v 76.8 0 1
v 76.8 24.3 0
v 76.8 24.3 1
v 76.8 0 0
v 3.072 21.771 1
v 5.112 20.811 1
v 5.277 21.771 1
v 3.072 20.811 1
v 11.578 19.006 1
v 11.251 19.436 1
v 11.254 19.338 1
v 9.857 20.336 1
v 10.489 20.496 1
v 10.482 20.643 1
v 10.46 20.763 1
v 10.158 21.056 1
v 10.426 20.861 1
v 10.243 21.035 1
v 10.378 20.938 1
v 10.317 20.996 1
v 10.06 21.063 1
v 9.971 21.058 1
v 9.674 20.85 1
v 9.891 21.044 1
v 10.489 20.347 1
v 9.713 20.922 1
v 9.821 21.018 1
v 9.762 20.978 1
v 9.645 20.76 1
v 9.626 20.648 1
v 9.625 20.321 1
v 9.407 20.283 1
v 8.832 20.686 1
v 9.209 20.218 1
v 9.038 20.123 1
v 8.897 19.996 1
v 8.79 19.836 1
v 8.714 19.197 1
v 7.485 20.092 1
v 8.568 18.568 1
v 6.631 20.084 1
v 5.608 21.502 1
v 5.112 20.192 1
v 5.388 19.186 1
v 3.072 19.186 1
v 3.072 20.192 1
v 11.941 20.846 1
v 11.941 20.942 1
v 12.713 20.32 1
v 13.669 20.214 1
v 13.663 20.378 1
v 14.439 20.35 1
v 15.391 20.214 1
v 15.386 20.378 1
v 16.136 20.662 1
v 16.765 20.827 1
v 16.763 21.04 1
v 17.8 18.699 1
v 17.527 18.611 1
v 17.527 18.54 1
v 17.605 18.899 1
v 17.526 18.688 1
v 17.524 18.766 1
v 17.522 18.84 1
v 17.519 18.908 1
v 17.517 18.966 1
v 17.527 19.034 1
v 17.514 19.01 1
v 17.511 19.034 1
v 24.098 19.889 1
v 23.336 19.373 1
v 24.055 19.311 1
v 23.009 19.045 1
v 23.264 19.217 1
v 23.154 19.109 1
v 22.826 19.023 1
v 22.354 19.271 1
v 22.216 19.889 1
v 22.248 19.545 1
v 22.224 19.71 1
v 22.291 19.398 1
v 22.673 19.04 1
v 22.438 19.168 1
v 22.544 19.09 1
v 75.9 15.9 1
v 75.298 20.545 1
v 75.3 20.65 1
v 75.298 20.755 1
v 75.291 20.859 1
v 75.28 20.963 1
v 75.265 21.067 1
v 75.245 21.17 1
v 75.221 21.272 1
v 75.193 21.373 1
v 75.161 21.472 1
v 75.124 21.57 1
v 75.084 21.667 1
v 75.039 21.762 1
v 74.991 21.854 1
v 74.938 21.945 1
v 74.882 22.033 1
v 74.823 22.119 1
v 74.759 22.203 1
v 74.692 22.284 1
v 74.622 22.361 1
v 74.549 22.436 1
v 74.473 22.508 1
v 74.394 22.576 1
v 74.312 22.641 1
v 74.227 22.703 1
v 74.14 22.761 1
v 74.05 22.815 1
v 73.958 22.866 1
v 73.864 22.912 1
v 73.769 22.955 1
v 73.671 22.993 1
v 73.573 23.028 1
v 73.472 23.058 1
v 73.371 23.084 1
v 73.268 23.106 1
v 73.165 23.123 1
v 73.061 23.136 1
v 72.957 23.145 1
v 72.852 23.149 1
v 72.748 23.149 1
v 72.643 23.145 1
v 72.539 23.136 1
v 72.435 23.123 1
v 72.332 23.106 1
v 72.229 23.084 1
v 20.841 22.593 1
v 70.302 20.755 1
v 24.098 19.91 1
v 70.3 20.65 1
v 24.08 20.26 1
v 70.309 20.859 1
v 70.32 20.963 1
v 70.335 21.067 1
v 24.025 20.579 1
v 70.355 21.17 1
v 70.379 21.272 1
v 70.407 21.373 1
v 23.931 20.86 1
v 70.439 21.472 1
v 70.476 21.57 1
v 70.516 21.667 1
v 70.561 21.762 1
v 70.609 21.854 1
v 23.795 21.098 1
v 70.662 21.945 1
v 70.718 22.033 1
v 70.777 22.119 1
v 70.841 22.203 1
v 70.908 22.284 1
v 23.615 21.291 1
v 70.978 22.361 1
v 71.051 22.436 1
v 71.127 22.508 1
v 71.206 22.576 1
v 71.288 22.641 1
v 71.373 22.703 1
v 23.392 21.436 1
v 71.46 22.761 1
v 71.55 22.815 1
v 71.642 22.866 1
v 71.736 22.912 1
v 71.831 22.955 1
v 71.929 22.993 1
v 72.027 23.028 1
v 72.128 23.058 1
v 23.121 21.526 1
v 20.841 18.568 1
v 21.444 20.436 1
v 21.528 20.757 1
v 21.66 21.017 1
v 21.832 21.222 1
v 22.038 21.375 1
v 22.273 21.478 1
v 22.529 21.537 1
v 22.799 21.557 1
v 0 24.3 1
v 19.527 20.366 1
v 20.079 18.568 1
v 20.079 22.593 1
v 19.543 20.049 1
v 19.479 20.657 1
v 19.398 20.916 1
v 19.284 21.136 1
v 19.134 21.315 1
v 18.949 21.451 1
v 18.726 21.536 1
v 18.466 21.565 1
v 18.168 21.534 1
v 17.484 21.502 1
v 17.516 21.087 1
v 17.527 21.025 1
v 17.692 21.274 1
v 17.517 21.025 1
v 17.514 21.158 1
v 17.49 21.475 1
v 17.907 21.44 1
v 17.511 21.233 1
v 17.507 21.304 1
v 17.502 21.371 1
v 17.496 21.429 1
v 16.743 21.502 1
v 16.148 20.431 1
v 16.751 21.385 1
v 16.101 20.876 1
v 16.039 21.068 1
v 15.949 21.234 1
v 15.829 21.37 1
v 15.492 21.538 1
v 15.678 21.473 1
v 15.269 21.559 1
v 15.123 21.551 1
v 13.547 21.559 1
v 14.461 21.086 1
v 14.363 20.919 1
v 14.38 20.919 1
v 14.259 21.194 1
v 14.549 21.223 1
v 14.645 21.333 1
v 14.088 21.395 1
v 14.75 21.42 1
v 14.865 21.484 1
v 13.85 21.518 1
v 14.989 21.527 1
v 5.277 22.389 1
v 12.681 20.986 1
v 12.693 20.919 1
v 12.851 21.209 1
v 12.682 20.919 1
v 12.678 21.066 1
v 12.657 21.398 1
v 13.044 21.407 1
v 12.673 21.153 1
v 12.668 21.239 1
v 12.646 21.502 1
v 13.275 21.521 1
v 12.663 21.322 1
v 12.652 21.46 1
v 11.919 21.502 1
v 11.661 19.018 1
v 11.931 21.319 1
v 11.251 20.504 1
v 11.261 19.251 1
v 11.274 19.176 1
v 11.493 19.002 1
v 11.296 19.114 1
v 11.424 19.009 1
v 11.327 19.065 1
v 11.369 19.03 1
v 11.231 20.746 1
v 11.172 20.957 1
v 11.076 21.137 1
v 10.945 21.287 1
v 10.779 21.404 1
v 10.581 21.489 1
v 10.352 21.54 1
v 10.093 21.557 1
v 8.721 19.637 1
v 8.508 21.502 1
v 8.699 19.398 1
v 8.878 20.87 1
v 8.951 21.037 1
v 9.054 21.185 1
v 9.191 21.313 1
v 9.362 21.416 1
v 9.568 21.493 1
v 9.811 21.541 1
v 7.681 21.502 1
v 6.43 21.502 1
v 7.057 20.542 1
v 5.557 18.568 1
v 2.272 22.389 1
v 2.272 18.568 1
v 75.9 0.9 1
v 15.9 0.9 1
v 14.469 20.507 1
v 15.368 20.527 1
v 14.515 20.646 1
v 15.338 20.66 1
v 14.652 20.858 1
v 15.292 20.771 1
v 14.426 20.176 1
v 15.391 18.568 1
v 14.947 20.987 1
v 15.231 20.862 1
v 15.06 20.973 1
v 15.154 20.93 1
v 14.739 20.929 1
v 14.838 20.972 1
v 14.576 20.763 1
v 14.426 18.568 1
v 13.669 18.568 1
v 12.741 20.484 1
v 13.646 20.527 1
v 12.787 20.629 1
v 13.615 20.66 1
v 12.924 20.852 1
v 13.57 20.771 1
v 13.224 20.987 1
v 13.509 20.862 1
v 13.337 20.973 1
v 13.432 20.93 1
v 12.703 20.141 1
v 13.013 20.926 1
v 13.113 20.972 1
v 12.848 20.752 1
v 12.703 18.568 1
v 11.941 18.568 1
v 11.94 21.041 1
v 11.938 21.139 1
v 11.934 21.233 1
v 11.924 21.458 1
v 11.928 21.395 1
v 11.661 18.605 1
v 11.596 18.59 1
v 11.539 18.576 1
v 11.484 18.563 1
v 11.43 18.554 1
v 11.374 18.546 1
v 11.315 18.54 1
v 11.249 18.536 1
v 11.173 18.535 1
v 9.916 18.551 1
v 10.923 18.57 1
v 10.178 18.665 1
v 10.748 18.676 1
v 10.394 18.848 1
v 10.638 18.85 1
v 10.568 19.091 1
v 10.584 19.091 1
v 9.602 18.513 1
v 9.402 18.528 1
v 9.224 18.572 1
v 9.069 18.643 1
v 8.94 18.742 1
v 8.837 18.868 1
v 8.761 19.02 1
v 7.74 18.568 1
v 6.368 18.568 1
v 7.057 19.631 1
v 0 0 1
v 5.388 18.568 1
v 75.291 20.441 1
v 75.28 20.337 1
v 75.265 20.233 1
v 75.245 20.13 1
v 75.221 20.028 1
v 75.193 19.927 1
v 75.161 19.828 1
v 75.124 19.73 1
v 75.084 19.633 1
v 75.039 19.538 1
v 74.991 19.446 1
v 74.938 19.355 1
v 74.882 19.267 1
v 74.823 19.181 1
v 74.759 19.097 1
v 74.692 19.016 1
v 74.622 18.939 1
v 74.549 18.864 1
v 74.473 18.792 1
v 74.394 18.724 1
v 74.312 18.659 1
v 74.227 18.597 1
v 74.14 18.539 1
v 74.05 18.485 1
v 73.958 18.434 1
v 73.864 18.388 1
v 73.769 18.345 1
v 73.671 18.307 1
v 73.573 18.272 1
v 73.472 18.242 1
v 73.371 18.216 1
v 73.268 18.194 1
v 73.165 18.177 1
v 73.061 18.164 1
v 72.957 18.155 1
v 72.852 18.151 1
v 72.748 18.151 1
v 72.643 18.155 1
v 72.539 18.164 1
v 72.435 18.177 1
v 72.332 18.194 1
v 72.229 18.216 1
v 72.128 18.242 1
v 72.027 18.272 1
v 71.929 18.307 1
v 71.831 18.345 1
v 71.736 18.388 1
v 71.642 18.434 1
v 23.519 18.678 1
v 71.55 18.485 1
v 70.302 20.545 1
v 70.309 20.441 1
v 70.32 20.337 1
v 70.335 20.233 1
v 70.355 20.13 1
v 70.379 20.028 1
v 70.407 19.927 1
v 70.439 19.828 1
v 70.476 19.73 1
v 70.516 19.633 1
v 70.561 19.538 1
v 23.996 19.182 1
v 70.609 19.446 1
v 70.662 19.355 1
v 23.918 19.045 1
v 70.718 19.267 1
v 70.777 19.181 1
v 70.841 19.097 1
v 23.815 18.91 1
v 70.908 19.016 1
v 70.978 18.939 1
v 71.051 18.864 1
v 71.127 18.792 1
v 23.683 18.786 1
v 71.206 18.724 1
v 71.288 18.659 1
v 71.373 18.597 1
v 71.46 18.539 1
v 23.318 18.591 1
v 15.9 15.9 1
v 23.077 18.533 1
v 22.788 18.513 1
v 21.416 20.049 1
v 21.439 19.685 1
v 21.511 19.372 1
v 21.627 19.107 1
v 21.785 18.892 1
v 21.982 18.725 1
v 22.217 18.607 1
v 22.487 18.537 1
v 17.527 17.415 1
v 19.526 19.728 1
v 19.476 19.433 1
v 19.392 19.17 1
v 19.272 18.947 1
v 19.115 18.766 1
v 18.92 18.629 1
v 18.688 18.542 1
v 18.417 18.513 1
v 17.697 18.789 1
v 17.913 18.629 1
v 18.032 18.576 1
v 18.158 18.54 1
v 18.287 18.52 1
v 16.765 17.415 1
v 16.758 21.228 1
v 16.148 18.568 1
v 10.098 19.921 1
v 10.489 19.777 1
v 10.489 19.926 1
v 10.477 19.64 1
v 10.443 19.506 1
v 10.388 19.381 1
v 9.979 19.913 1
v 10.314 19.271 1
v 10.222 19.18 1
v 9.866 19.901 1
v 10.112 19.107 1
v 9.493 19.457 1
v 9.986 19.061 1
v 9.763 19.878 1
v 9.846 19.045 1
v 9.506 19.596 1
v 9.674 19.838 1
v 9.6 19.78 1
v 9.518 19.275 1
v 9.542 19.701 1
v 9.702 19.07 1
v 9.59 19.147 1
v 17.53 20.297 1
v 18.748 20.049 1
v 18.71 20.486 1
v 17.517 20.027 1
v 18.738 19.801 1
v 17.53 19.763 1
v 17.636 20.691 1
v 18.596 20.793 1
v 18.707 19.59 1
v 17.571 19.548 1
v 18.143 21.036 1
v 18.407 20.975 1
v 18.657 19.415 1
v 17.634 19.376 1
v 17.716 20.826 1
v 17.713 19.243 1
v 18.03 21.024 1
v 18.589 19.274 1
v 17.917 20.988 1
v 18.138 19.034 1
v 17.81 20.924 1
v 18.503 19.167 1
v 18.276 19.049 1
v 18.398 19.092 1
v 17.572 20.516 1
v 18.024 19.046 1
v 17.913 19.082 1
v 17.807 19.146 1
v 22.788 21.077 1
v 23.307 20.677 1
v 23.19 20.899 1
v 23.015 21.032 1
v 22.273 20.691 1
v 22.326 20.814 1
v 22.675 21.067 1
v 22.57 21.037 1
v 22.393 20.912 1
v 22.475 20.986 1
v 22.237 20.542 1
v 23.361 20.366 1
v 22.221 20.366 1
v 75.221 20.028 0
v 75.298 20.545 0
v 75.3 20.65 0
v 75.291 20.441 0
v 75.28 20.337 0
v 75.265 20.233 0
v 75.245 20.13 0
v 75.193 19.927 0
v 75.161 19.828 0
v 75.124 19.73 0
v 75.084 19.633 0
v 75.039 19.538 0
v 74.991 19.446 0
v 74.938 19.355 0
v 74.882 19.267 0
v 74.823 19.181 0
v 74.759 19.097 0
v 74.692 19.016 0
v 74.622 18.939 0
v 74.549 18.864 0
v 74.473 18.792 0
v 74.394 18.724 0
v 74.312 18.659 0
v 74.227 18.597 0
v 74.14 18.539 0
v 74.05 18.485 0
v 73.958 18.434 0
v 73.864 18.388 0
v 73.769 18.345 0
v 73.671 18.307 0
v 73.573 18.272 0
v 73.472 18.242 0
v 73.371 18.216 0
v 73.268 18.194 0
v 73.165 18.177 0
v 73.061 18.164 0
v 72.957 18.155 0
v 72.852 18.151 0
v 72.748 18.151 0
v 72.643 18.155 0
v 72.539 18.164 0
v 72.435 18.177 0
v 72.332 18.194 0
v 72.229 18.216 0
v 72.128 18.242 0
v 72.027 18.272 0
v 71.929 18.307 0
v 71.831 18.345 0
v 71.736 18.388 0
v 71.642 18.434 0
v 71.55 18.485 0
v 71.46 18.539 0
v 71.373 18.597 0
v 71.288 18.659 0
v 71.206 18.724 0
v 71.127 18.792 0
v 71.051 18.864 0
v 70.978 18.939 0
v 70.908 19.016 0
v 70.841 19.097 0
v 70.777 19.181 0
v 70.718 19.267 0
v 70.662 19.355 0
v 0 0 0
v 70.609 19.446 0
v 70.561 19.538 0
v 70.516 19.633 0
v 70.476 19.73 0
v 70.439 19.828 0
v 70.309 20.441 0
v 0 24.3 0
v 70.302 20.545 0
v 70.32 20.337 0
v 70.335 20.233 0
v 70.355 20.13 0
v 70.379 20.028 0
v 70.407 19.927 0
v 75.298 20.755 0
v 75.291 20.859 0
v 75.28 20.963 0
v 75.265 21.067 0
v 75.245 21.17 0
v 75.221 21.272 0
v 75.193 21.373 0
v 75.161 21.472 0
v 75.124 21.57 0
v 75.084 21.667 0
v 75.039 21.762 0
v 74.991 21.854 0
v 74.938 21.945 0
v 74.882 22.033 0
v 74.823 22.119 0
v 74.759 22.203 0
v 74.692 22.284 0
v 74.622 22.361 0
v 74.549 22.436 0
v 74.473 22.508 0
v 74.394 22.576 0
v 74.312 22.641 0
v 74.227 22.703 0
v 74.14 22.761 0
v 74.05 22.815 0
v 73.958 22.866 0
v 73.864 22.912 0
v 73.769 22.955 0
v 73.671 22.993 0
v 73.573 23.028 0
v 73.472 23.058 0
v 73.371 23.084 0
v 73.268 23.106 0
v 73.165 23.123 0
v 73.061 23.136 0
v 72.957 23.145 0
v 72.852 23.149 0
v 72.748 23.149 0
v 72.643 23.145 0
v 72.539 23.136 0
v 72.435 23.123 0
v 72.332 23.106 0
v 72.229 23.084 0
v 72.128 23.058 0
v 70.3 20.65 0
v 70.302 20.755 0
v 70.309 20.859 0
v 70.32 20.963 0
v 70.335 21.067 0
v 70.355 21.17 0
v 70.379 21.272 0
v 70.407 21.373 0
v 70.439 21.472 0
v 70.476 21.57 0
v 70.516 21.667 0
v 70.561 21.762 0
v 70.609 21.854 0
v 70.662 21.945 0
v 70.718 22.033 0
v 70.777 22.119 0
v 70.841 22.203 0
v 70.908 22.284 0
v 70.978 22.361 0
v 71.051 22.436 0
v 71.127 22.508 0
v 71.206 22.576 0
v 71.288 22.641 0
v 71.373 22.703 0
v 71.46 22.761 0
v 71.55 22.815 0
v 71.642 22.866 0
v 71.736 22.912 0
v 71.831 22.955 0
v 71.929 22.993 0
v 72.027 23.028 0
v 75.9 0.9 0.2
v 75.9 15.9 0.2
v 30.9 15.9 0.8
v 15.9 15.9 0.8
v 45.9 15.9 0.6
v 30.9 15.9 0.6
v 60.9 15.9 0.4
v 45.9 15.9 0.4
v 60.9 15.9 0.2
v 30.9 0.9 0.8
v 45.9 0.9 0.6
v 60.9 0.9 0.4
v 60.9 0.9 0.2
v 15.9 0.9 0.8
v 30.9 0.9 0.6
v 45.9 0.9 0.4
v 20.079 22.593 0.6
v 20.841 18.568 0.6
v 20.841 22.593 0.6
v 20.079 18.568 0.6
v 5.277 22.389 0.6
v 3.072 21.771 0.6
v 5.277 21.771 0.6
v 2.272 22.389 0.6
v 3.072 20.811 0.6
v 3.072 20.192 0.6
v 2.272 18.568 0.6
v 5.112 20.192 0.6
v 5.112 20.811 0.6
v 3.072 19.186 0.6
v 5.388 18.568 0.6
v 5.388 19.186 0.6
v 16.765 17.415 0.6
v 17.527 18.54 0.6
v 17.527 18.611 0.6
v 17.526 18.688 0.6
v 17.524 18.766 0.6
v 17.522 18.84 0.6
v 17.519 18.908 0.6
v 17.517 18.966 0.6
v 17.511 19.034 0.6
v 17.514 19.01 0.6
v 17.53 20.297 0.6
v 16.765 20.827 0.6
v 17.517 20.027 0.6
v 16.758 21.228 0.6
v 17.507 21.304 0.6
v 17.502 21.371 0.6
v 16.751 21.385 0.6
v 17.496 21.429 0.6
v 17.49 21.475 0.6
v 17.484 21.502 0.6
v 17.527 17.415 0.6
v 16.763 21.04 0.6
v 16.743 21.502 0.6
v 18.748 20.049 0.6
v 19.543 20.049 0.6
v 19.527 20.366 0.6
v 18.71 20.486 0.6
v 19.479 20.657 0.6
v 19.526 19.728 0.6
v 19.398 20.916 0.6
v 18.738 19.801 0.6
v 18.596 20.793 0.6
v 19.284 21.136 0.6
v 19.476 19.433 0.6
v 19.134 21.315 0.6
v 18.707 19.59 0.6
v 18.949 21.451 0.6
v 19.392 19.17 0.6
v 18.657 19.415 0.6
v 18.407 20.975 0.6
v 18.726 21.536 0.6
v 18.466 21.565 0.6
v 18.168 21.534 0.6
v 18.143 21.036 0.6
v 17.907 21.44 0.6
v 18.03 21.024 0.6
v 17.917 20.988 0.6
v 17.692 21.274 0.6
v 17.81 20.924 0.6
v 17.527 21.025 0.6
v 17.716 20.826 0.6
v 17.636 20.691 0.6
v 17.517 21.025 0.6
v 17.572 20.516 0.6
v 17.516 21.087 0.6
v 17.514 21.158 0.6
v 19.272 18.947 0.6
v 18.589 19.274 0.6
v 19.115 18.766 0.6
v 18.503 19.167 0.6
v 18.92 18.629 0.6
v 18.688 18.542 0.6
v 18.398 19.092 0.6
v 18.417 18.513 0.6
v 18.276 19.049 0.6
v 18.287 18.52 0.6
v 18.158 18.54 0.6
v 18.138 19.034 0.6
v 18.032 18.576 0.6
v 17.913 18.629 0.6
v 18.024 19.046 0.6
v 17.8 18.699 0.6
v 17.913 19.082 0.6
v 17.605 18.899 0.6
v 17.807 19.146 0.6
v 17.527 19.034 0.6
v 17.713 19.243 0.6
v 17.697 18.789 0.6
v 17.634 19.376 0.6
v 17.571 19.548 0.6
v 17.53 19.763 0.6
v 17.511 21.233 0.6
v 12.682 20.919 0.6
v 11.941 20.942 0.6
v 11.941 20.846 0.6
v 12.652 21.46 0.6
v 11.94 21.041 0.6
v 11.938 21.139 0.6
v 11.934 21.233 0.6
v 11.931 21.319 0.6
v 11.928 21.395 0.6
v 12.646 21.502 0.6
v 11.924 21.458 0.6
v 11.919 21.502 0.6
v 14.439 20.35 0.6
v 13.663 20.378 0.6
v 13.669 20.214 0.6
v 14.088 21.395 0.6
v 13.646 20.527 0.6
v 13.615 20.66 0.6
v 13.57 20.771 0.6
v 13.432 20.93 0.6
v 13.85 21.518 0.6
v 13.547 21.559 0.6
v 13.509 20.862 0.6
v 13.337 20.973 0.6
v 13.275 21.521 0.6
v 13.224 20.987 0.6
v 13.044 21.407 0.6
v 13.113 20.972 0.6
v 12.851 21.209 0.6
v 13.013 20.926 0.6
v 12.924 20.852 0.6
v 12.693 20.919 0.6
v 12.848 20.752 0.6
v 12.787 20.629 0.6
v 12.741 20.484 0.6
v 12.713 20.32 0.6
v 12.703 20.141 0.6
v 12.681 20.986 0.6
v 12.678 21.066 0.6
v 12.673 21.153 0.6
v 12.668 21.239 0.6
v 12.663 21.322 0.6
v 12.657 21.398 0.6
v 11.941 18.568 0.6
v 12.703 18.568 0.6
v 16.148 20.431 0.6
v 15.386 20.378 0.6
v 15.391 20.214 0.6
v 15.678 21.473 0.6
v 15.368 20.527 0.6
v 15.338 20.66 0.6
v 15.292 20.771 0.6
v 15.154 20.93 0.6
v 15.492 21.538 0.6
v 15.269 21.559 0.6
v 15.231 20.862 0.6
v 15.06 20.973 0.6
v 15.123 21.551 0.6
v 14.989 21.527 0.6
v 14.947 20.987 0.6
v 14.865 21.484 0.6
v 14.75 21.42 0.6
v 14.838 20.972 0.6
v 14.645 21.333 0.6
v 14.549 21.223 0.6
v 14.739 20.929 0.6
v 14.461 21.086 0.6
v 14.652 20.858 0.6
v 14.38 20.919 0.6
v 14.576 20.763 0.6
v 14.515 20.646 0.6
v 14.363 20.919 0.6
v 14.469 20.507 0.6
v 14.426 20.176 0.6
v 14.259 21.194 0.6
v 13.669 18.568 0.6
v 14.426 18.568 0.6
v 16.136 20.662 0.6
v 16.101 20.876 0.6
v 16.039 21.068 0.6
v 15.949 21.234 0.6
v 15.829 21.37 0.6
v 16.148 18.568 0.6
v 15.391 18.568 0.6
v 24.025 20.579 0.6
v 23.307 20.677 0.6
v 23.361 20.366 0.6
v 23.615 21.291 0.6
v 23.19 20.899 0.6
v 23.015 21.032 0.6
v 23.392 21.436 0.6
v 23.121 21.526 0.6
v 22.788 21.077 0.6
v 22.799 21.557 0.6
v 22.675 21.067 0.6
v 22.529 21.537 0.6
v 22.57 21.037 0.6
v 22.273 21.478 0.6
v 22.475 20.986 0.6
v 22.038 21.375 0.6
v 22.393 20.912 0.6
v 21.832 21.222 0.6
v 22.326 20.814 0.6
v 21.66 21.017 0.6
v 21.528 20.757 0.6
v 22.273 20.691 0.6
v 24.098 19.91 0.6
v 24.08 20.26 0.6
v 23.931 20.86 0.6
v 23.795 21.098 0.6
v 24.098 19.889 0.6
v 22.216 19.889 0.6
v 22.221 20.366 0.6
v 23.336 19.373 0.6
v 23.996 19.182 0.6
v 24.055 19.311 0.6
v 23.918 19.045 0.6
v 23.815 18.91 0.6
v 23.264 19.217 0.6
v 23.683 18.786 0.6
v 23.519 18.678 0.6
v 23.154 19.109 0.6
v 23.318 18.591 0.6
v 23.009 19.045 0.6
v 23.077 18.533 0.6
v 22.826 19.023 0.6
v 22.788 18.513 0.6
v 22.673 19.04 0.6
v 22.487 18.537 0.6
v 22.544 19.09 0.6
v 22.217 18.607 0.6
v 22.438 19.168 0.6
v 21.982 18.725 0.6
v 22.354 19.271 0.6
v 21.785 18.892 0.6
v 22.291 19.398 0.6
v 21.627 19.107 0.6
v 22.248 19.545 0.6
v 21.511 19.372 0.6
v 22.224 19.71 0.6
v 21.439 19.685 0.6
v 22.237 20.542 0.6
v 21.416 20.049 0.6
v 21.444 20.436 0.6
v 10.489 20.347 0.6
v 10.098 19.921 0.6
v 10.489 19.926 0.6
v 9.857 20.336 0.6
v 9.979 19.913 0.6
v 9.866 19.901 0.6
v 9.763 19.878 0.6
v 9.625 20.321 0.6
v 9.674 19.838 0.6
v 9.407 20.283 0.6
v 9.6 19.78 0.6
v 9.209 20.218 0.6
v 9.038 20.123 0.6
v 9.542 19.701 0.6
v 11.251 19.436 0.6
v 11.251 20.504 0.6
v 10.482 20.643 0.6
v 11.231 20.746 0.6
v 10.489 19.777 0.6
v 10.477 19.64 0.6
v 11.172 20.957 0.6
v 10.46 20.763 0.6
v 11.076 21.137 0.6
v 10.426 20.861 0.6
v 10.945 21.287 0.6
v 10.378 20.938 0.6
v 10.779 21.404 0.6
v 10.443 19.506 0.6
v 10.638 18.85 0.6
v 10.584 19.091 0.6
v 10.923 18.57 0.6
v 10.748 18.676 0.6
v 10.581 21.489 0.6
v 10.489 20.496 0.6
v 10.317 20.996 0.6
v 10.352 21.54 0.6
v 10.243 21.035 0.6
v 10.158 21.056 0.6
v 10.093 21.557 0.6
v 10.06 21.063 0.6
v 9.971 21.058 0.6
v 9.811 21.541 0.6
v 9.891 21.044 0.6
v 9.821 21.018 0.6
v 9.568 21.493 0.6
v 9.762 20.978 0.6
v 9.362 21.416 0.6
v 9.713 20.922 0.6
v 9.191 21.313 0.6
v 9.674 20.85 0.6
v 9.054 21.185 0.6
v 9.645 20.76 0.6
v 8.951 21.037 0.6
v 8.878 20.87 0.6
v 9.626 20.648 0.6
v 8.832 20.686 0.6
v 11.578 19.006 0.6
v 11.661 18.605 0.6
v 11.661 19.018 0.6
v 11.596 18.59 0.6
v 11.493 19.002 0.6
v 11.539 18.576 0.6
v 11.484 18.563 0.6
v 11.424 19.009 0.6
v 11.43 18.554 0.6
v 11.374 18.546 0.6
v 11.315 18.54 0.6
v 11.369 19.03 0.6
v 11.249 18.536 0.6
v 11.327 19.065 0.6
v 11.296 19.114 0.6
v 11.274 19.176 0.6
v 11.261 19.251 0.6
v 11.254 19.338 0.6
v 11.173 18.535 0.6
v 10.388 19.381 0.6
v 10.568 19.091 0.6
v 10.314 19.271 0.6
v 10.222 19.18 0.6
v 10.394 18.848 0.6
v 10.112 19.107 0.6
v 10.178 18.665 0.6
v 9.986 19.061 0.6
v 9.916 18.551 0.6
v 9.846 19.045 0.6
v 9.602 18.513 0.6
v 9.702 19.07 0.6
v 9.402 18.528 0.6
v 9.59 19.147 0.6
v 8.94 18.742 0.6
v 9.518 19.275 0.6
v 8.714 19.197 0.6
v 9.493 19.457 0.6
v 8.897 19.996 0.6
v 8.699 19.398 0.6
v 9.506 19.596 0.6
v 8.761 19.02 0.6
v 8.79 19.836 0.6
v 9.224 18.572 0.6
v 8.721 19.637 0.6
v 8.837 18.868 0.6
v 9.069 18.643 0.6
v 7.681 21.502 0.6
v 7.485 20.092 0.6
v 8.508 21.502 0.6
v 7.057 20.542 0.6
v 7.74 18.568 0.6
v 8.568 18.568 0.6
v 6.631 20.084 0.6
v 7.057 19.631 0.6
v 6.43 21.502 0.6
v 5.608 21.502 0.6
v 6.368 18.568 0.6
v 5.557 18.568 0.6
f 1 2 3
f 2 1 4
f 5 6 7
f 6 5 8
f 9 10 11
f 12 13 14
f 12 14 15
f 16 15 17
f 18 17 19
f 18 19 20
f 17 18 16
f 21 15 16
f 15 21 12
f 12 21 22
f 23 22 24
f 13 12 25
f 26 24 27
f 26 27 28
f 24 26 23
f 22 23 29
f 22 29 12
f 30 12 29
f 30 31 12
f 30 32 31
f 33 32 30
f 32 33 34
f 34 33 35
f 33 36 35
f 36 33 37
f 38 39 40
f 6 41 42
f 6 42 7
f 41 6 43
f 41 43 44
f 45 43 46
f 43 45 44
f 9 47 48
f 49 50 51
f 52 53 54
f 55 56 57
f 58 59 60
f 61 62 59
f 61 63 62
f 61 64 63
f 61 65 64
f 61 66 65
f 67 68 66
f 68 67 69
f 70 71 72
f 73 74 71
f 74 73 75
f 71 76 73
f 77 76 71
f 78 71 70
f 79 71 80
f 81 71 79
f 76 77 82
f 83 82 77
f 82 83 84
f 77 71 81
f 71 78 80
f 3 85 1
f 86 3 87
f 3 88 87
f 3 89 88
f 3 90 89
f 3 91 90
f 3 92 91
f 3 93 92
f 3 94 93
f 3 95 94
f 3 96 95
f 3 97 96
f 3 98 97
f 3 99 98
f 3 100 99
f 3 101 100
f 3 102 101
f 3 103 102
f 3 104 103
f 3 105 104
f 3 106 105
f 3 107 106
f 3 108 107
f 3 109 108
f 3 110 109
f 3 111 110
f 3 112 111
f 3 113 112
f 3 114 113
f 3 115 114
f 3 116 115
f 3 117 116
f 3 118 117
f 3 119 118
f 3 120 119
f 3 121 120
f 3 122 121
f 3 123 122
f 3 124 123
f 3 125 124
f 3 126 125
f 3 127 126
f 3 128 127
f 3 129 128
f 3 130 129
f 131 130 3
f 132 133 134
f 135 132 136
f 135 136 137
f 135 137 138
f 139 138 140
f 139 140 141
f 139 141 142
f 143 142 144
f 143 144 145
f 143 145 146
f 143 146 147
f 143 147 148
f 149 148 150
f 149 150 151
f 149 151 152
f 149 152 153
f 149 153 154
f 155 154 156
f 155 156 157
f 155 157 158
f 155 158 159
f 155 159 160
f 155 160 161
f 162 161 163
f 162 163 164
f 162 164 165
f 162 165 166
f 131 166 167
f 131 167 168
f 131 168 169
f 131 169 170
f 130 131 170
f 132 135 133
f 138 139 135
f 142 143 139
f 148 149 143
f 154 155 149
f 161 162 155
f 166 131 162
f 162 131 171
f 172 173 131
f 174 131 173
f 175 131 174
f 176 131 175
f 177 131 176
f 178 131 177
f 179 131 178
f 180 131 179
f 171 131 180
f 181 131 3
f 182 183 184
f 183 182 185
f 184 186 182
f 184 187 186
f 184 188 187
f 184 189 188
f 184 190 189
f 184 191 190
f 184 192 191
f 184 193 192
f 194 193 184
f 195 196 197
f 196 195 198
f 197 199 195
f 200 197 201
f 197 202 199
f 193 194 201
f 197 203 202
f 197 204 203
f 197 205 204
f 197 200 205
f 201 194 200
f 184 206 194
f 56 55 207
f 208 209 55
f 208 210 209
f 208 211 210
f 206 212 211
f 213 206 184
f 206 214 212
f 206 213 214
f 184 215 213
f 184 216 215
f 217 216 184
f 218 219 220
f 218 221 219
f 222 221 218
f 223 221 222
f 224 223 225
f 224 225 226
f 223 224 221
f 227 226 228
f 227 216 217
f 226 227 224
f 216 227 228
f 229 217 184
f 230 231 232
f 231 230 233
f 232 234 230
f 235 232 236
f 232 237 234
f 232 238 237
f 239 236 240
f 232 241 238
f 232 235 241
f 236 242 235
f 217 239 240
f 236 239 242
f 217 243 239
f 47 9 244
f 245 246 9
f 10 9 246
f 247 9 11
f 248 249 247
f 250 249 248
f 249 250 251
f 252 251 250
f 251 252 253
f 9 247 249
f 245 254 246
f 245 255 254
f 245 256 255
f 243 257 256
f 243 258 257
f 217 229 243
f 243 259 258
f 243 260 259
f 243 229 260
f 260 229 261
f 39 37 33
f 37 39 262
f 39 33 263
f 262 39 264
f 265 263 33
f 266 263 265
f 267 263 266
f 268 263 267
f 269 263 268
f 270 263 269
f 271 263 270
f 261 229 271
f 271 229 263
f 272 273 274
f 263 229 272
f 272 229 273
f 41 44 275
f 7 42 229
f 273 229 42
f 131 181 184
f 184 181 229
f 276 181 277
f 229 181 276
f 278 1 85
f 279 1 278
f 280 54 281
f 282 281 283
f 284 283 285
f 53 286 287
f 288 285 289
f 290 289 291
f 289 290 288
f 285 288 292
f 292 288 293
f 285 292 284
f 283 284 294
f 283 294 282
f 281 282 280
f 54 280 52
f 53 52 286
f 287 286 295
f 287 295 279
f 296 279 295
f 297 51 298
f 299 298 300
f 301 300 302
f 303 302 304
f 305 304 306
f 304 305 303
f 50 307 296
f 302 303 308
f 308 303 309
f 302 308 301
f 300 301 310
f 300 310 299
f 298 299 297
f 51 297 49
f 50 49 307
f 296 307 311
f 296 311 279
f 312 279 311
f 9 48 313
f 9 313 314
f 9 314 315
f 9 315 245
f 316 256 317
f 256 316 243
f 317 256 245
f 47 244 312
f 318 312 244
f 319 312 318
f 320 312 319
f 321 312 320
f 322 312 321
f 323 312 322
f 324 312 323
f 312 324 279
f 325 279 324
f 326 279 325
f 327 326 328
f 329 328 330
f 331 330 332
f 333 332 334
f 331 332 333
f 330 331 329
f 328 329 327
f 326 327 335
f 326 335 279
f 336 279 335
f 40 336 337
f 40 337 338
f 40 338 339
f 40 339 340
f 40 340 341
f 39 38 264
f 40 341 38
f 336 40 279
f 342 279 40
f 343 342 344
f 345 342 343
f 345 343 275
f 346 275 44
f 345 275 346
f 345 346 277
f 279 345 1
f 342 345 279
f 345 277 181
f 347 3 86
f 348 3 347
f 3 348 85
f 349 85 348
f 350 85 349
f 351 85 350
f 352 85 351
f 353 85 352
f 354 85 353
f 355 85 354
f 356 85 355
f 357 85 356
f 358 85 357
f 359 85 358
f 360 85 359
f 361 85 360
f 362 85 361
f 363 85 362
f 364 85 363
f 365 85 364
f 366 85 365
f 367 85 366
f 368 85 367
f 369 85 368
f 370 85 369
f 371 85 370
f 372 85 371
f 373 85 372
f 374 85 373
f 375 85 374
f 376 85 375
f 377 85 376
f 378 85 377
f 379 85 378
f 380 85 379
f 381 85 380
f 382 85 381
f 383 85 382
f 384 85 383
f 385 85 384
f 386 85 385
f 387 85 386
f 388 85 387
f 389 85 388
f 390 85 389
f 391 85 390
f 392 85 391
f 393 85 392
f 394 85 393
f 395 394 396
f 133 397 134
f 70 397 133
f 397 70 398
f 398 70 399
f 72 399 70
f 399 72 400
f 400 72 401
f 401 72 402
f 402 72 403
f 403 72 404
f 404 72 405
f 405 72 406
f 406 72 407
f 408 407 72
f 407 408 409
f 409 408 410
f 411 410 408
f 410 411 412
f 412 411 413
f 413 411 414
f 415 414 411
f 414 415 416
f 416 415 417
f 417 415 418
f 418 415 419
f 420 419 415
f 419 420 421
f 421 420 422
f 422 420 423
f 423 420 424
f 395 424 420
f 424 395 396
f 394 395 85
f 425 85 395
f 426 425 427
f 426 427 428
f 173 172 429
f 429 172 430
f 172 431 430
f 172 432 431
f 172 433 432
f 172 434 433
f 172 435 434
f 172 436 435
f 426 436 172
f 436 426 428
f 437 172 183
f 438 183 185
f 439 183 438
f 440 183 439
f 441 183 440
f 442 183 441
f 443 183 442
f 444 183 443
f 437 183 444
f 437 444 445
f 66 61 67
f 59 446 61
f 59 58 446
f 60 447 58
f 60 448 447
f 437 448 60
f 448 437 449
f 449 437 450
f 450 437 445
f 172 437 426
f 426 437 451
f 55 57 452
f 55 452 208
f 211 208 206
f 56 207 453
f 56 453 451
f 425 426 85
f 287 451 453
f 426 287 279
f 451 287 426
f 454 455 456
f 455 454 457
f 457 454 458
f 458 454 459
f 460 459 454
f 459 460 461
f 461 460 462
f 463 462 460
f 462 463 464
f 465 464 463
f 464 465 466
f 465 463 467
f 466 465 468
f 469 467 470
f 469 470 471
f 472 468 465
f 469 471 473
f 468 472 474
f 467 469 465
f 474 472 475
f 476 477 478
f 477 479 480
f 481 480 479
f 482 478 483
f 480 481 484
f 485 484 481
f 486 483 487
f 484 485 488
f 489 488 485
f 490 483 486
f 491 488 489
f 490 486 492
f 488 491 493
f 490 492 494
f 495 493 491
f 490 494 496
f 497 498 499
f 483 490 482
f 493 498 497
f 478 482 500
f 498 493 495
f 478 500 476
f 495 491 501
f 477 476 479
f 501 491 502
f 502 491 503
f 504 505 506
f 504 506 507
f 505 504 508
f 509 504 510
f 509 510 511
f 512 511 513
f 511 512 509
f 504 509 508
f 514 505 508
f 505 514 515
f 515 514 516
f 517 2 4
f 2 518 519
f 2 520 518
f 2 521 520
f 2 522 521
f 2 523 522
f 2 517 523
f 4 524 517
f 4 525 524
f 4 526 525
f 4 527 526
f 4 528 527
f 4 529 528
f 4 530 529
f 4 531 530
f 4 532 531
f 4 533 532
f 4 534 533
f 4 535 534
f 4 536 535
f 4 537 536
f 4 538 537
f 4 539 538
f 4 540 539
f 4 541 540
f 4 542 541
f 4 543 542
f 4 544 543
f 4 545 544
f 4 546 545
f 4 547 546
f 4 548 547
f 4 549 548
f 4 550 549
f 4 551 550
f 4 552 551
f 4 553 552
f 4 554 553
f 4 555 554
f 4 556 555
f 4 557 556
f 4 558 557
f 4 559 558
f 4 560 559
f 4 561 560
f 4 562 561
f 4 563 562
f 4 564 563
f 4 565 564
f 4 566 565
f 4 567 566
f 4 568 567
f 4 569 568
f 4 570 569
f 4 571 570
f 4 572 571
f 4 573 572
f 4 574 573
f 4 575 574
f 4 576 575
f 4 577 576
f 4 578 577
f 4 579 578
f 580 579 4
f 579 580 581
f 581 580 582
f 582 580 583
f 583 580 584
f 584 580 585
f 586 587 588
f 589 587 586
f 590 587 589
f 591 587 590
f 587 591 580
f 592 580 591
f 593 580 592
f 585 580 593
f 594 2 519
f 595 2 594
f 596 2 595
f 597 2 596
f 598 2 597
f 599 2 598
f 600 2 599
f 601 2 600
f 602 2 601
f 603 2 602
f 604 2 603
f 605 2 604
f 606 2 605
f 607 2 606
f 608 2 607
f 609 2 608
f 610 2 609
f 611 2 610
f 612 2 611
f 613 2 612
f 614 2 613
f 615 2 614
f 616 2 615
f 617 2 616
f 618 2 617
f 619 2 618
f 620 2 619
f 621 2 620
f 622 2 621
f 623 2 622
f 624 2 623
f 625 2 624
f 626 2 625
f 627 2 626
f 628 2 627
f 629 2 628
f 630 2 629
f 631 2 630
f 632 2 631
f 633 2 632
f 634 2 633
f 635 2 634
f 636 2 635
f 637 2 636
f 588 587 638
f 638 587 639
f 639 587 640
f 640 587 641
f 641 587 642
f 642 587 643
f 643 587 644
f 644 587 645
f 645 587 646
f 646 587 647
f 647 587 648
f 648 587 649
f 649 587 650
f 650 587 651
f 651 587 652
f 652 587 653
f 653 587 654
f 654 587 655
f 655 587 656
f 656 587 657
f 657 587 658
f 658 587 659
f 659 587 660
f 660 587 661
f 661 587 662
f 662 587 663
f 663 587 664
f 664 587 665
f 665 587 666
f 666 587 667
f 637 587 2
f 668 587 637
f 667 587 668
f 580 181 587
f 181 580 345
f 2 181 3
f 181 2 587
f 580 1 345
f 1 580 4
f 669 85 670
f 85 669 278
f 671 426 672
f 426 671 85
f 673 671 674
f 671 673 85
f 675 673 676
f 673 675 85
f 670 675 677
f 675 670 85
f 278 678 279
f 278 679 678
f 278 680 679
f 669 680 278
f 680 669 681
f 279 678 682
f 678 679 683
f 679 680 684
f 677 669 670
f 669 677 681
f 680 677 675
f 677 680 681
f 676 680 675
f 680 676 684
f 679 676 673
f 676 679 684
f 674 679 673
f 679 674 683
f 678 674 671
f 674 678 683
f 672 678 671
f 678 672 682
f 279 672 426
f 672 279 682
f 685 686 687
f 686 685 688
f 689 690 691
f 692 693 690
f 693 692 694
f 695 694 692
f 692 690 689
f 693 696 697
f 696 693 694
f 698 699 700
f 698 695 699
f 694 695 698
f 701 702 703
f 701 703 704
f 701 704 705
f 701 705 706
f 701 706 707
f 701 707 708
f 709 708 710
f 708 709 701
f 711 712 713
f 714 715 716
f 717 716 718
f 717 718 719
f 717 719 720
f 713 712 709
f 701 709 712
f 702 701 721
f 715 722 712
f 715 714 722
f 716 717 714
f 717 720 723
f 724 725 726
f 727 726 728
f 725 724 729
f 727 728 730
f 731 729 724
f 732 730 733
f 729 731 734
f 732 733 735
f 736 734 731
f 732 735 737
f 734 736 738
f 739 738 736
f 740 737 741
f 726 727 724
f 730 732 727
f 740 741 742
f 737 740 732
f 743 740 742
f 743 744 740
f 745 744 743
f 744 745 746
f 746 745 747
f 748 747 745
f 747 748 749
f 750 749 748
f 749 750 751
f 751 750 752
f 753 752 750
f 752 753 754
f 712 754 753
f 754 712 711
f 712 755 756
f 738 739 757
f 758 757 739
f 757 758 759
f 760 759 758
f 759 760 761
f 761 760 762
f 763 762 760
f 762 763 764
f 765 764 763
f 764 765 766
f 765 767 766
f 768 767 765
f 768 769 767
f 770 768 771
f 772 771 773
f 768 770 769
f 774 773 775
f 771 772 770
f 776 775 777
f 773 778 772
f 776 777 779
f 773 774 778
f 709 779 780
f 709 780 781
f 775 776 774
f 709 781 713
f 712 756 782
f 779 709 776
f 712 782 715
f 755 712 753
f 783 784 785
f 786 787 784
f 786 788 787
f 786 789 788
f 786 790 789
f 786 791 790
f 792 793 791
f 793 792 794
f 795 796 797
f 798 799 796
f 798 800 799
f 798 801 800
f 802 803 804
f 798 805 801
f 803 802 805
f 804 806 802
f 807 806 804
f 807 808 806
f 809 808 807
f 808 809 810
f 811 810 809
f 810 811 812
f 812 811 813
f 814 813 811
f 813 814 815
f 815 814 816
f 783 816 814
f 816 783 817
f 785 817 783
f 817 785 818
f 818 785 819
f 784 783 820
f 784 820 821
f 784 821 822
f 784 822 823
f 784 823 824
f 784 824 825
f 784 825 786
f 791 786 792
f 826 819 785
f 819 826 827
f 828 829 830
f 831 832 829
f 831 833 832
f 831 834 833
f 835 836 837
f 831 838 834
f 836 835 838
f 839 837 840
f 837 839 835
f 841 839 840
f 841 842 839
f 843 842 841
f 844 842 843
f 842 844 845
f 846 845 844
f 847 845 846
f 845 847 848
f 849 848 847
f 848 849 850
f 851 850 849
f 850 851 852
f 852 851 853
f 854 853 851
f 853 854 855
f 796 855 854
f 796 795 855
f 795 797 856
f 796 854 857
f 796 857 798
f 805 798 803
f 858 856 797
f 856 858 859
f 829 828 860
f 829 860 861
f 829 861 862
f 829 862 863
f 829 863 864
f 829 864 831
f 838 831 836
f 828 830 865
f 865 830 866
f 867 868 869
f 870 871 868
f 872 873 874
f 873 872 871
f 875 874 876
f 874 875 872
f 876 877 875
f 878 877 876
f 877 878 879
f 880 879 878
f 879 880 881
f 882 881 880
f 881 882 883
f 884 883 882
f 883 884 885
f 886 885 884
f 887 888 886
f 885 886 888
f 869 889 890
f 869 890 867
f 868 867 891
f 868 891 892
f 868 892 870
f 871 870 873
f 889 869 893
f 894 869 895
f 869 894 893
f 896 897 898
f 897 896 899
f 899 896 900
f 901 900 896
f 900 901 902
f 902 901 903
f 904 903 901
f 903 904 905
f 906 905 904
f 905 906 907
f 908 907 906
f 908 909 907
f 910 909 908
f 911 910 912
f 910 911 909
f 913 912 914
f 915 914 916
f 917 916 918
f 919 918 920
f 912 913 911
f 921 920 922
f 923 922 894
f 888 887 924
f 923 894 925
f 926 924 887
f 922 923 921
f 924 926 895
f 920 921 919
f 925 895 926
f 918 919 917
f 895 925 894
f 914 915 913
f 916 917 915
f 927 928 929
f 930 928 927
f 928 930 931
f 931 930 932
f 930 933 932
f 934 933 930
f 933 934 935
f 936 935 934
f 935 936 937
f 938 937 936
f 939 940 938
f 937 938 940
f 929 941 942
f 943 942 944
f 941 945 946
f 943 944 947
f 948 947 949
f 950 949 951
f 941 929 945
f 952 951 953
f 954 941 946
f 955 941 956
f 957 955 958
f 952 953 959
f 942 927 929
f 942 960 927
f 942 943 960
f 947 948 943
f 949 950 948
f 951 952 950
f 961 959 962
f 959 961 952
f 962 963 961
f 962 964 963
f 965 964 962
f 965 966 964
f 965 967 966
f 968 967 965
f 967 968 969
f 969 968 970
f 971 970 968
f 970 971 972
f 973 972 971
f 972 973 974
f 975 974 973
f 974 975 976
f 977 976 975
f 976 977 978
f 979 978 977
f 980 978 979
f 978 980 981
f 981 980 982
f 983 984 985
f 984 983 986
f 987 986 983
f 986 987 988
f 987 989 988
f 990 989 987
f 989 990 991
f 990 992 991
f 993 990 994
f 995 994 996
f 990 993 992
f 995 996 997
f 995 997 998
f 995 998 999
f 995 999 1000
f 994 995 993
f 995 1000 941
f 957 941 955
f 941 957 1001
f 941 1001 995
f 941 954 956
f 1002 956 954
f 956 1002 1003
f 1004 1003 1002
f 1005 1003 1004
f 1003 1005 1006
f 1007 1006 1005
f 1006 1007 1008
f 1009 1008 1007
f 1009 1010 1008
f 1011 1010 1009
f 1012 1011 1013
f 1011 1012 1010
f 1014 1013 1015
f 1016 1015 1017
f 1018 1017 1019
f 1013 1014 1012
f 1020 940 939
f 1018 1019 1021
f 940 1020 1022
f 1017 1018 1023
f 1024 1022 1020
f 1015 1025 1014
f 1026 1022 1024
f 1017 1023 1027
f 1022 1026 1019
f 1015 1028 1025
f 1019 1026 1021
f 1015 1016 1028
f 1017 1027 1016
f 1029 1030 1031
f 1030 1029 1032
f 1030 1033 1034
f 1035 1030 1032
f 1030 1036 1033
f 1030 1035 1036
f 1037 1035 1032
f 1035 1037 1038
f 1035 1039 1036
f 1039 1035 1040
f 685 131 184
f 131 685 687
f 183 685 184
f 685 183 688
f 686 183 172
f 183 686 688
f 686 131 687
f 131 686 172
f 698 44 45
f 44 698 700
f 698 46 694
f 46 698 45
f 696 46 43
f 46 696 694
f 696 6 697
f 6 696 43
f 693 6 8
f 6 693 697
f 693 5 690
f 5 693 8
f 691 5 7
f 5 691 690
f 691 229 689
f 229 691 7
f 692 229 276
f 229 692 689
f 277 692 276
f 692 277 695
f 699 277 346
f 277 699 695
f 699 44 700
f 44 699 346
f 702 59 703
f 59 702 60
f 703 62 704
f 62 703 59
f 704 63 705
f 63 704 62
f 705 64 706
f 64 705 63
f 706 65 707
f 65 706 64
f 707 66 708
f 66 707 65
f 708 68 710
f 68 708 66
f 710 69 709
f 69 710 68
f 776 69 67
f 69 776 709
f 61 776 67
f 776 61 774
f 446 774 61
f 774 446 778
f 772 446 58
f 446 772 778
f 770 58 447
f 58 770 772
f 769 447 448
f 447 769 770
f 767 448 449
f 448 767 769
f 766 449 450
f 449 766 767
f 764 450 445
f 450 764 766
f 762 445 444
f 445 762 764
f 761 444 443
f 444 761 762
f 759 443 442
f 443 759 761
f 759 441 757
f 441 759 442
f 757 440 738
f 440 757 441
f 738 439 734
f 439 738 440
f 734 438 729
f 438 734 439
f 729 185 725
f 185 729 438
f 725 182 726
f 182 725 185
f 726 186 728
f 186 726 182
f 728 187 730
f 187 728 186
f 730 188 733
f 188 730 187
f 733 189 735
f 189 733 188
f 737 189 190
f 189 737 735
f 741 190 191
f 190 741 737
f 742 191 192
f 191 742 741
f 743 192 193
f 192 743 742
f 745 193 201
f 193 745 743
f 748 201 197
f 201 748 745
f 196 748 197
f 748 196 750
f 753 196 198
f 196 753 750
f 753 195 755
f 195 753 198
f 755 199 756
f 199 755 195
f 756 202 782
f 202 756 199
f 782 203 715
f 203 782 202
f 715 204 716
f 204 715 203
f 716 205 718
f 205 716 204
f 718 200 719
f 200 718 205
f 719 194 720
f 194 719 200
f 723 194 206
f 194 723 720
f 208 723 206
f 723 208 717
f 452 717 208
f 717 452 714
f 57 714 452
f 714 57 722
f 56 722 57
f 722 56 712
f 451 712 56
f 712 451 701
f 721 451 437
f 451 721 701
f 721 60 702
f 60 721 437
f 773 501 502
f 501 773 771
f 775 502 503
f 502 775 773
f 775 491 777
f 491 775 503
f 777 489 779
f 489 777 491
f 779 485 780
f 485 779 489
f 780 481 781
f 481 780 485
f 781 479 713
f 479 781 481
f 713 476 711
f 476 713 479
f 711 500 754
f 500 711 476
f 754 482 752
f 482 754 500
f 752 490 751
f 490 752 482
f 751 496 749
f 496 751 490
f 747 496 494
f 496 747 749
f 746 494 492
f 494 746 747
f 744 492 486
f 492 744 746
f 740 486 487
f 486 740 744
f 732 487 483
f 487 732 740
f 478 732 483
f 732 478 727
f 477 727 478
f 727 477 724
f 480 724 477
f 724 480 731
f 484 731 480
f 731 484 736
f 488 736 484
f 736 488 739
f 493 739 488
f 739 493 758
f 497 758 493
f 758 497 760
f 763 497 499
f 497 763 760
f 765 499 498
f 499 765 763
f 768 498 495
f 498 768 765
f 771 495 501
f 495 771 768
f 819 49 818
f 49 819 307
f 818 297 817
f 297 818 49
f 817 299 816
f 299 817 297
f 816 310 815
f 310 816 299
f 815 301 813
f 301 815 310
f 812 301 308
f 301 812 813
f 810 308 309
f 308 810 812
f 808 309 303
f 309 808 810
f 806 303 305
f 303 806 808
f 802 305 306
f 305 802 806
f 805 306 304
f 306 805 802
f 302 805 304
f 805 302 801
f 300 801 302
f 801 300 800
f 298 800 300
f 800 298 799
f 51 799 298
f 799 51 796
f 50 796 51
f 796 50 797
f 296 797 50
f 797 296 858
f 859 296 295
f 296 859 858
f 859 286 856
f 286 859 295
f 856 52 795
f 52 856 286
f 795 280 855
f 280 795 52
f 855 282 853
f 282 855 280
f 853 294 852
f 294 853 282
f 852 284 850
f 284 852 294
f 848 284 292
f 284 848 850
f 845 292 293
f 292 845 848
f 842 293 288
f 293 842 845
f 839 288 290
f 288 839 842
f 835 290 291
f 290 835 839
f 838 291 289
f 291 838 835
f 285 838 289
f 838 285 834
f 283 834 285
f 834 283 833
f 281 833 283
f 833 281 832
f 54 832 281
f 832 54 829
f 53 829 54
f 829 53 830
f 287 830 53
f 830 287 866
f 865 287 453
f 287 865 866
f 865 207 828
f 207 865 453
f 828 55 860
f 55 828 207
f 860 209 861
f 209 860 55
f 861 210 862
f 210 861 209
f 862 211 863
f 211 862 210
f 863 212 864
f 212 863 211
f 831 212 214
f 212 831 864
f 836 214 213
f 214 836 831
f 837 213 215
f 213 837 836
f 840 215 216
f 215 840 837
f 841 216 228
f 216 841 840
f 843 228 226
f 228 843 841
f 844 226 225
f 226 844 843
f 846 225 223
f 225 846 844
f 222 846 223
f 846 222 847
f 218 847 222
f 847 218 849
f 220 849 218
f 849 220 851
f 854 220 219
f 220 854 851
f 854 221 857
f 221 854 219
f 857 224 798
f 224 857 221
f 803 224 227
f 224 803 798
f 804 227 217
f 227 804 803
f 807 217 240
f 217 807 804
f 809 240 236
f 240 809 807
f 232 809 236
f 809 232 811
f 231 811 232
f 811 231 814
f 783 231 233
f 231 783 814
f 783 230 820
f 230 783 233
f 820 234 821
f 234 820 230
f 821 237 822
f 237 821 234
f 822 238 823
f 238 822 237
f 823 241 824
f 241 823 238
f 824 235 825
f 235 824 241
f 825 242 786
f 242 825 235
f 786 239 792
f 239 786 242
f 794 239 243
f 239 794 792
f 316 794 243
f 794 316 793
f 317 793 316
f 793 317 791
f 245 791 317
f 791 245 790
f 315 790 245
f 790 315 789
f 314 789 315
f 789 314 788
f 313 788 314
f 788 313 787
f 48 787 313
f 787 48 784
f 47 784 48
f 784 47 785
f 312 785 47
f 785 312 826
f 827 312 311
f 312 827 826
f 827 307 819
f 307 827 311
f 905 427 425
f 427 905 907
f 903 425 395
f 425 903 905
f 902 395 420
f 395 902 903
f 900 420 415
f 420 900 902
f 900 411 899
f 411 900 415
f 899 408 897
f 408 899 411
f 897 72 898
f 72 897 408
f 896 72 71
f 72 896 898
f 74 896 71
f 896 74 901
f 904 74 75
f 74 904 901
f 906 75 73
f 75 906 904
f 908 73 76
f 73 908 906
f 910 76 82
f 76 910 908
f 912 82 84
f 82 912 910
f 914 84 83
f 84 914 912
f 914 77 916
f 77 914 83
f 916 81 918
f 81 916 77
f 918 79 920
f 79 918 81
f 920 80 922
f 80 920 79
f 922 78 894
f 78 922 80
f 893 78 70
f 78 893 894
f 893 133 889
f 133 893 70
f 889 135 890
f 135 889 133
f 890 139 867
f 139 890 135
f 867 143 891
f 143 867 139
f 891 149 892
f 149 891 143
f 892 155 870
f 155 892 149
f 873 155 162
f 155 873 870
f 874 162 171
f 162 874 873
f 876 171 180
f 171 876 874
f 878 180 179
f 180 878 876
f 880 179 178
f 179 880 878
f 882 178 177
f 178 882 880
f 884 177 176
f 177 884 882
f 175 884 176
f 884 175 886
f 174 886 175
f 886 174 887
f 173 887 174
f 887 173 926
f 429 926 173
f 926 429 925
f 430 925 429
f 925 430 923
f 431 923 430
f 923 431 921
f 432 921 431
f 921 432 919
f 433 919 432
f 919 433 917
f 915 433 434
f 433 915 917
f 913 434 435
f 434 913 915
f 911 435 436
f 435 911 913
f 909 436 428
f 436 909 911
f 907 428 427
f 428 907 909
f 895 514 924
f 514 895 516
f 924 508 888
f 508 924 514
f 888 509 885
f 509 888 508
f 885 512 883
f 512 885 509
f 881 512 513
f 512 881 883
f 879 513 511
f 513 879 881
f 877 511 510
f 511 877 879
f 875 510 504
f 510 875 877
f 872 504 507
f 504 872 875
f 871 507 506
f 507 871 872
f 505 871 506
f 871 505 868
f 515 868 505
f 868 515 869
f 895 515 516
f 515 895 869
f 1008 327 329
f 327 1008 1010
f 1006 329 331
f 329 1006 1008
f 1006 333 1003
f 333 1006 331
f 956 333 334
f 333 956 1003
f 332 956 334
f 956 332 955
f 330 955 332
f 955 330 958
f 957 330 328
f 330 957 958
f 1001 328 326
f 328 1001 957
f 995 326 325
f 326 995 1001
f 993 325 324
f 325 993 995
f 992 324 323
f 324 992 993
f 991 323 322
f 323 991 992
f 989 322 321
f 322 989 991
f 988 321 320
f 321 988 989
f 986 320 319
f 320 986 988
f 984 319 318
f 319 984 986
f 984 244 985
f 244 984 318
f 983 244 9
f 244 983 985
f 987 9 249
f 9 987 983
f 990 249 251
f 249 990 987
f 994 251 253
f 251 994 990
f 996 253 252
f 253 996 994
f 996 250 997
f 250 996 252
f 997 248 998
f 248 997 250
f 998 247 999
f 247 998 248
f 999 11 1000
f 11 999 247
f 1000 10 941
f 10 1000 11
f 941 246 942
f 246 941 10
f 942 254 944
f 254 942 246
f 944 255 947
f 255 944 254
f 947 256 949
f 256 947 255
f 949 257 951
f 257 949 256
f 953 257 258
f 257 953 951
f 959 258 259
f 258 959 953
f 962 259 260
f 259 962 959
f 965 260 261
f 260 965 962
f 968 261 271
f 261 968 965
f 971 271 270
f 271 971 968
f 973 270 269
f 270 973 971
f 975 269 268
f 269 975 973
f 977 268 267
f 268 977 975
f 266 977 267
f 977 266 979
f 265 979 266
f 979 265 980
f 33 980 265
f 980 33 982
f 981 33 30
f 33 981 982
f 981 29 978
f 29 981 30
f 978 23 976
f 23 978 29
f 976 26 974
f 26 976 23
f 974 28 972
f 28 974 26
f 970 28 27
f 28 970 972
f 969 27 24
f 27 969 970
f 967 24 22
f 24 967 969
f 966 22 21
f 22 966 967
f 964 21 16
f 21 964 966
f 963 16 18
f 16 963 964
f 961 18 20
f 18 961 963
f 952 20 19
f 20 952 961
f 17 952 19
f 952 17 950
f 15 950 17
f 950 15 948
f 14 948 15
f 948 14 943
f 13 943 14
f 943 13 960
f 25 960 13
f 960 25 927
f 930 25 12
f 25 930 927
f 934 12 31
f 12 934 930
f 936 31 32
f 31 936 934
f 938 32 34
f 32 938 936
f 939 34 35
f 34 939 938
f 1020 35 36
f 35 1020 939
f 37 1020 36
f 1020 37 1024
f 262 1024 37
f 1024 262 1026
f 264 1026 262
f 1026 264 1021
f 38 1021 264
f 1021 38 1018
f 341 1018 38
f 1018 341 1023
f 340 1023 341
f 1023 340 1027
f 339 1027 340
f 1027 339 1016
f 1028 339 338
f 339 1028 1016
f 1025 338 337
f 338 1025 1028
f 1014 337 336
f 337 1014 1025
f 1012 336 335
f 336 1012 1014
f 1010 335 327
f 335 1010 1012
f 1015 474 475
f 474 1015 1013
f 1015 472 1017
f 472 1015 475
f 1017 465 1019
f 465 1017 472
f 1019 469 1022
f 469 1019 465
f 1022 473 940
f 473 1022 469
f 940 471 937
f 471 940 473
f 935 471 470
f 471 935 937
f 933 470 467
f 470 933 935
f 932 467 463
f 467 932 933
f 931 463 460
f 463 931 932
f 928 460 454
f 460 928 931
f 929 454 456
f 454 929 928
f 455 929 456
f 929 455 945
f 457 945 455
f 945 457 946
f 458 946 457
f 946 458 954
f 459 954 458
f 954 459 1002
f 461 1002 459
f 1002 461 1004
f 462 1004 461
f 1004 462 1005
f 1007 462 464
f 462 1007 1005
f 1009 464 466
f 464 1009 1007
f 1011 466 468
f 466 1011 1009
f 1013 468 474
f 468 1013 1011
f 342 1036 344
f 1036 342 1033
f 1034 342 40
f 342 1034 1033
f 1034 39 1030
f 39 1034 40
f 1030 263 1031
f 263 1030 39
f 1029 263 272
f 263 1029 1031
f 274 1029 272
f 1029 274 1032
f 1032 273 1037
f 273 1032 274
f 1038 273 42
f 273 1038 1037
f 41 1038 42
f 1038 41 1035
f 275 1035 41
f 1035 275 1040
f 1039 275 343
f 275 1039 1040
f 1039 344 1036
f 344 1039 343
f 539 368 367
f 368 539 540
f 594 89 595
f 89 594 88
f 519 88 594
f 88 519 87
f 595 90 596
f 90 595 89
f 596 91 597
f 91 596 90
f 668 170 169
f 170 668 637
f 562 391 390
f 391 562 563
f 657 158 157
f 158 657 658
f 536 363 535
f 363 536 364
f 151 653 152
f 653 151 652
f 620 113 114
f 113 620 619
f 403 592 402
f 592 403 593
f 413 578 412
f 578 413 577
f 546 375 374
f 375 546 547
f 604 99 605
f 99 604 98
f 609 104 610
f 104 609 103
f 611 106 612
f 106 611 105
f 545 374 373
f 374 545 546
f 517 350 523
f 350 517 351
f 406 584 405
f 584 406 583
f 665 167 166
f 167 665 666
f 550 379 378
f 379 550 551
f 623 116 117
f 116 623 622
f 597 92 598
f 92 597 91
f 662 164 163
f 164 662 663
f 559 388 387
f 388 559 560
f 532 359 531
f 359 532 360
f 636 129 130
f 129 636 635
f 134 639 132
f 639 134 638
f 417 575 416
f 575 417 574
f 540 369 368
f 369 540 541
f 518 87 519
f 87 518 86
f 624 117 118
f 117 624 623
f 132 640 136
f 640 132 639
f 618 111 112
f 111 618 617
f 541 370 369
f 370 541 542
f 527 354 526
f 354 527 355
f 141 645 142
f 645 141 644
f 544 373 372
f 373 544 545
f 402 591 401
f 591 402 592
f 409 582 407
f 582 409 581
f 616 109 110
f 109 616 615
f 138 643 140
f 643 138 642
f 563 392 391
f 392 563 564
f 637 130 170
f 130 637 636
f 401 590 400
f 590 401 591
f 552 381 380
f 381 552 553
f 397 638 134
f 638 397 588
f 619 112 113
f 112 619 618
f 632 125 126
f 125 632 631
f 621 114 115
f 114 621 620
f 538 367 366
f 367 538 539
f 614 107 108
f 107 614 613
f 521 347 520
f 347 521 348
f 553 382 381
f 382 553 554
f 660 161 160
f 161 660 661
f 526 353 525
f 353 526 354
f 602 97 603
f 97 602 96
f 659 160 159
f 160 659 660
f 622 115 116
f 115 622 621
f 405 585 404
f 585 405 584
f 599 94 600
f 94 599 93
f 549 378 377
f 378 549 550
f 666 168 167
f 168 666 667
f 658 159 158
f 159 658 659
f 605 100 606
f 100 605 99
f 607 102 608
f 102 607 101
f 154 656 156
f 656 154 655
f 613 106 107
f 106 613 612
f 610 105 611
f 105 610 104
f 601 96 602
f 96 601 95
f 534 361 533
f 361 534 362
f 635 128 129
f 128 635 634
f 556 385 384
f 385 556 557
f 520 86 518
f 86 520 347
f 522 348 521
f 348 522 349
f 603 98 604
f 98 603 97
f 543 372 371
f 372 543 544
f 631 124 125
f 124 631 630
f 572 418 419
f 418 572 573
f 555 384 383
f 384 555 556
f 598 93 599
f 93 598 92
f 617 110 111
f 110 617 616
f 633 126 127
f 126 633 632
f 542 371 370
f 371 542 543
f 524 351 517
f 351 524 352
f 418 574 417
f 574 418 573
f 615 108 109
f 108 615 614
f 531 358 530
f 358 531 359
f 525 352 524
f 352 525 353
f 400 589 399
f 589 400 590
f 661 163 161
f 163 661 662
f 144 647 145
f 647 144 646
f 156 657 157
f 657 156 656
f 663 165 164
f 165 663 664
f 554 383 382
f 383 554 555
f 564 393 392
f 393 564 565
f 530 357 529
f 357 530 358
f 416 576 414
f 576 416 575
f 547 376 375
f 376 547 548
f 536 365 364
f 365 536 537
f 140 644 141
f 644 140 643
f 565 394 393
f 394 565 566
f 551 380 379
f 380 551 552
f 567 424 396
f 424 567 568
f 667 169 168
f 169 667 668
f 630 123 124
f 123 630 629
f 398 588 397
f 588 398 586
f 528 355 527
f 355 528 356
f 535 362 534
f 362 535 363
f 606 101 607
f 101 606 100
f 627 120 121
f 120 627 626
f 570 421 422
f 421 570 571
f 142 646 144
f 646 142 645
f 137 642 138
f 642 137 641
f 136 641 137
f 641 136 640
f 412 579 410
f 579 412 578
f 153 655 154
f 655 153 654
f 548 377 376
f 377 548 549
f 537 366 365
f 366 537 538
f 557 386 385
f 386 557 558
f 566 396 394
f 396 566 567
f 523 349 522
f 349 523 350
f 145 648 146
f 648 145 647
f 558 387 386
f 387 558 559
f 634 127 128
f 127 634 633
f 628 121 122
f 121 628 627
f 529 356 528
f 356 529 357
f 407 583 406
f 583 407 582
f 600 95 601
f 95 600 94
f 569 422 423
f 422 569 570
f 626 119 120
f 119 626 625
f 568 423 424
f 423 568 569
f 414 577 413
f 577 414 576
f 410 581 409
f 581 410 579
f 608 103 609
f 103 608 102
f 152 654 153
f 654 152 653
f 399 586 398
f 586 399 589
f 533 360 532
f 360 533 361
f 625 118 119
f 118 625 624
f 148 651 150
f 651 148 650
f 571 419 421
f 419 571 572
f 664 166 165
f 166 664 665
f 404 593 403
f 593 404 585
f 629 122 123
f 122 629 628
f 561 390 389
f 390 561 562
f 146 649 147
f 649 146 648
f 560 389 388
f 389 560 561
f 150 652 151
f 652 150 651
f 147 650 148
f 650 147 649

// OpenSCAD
label_text = "Example";
text_size = 4;
text_emboss_depth = 0.4;
swatch_square_size = 15;
num_squares = 5;
3d_line_width = 0.45;
3d_line_height = 0.2;
add_hole = "yes"; // [yes,no]
hole_diameter = 5;

/* [Hidden] */
border = 3d_line_width * 2;
total_width = swatch_square_size * 1.5 + (border * 2);
total_len = swatch_square_size * num_squares + (border * 2);
swatch_len = total_len - (border * 2);
ext_dist = 1;
_text_depth = 3d_line_height * num_squares - text_emboss_depth;
thickness = 3d_line_height * num_squares;

// preview[view:south, tilt:top]

module _text(label) {
    translate([border + 1, total_width - border * 2, _text_depth])
    linear_extrude(ext_dist) 
    text(label, size = text_size, valign = "top", halign = "left", font = "Helvetica:style=Bold");
}

difference() {
    union() {
        difference() {
            translate([0, 0, 0]) cube([total_len, total_width, 3d_line_height * num_squares]);
            translate([border, border, 0]) cube([swatch_len, swatch_square_size, 3d_line_height * 9]);
        }
        
        for(i = [0:num_squares - 1]) {
            translate([border, border, 3d_line_height * i]) cube([swatch_len - swatch_square_size * i, swatch_square_size, 3d_line_height]);
        }
        
    }
    
    _text(label_text);
    
    if(add_hole == "yes") {
        translate([total_len - hole_diameter + 1, total_width - ((total_width - swatch_square_size) / 2) + 1, -3d_line_height])
        cylinder($fn = 150, h = thickness + 3d_line_height * 2, r = hole_diameter / 2);
    }
}
